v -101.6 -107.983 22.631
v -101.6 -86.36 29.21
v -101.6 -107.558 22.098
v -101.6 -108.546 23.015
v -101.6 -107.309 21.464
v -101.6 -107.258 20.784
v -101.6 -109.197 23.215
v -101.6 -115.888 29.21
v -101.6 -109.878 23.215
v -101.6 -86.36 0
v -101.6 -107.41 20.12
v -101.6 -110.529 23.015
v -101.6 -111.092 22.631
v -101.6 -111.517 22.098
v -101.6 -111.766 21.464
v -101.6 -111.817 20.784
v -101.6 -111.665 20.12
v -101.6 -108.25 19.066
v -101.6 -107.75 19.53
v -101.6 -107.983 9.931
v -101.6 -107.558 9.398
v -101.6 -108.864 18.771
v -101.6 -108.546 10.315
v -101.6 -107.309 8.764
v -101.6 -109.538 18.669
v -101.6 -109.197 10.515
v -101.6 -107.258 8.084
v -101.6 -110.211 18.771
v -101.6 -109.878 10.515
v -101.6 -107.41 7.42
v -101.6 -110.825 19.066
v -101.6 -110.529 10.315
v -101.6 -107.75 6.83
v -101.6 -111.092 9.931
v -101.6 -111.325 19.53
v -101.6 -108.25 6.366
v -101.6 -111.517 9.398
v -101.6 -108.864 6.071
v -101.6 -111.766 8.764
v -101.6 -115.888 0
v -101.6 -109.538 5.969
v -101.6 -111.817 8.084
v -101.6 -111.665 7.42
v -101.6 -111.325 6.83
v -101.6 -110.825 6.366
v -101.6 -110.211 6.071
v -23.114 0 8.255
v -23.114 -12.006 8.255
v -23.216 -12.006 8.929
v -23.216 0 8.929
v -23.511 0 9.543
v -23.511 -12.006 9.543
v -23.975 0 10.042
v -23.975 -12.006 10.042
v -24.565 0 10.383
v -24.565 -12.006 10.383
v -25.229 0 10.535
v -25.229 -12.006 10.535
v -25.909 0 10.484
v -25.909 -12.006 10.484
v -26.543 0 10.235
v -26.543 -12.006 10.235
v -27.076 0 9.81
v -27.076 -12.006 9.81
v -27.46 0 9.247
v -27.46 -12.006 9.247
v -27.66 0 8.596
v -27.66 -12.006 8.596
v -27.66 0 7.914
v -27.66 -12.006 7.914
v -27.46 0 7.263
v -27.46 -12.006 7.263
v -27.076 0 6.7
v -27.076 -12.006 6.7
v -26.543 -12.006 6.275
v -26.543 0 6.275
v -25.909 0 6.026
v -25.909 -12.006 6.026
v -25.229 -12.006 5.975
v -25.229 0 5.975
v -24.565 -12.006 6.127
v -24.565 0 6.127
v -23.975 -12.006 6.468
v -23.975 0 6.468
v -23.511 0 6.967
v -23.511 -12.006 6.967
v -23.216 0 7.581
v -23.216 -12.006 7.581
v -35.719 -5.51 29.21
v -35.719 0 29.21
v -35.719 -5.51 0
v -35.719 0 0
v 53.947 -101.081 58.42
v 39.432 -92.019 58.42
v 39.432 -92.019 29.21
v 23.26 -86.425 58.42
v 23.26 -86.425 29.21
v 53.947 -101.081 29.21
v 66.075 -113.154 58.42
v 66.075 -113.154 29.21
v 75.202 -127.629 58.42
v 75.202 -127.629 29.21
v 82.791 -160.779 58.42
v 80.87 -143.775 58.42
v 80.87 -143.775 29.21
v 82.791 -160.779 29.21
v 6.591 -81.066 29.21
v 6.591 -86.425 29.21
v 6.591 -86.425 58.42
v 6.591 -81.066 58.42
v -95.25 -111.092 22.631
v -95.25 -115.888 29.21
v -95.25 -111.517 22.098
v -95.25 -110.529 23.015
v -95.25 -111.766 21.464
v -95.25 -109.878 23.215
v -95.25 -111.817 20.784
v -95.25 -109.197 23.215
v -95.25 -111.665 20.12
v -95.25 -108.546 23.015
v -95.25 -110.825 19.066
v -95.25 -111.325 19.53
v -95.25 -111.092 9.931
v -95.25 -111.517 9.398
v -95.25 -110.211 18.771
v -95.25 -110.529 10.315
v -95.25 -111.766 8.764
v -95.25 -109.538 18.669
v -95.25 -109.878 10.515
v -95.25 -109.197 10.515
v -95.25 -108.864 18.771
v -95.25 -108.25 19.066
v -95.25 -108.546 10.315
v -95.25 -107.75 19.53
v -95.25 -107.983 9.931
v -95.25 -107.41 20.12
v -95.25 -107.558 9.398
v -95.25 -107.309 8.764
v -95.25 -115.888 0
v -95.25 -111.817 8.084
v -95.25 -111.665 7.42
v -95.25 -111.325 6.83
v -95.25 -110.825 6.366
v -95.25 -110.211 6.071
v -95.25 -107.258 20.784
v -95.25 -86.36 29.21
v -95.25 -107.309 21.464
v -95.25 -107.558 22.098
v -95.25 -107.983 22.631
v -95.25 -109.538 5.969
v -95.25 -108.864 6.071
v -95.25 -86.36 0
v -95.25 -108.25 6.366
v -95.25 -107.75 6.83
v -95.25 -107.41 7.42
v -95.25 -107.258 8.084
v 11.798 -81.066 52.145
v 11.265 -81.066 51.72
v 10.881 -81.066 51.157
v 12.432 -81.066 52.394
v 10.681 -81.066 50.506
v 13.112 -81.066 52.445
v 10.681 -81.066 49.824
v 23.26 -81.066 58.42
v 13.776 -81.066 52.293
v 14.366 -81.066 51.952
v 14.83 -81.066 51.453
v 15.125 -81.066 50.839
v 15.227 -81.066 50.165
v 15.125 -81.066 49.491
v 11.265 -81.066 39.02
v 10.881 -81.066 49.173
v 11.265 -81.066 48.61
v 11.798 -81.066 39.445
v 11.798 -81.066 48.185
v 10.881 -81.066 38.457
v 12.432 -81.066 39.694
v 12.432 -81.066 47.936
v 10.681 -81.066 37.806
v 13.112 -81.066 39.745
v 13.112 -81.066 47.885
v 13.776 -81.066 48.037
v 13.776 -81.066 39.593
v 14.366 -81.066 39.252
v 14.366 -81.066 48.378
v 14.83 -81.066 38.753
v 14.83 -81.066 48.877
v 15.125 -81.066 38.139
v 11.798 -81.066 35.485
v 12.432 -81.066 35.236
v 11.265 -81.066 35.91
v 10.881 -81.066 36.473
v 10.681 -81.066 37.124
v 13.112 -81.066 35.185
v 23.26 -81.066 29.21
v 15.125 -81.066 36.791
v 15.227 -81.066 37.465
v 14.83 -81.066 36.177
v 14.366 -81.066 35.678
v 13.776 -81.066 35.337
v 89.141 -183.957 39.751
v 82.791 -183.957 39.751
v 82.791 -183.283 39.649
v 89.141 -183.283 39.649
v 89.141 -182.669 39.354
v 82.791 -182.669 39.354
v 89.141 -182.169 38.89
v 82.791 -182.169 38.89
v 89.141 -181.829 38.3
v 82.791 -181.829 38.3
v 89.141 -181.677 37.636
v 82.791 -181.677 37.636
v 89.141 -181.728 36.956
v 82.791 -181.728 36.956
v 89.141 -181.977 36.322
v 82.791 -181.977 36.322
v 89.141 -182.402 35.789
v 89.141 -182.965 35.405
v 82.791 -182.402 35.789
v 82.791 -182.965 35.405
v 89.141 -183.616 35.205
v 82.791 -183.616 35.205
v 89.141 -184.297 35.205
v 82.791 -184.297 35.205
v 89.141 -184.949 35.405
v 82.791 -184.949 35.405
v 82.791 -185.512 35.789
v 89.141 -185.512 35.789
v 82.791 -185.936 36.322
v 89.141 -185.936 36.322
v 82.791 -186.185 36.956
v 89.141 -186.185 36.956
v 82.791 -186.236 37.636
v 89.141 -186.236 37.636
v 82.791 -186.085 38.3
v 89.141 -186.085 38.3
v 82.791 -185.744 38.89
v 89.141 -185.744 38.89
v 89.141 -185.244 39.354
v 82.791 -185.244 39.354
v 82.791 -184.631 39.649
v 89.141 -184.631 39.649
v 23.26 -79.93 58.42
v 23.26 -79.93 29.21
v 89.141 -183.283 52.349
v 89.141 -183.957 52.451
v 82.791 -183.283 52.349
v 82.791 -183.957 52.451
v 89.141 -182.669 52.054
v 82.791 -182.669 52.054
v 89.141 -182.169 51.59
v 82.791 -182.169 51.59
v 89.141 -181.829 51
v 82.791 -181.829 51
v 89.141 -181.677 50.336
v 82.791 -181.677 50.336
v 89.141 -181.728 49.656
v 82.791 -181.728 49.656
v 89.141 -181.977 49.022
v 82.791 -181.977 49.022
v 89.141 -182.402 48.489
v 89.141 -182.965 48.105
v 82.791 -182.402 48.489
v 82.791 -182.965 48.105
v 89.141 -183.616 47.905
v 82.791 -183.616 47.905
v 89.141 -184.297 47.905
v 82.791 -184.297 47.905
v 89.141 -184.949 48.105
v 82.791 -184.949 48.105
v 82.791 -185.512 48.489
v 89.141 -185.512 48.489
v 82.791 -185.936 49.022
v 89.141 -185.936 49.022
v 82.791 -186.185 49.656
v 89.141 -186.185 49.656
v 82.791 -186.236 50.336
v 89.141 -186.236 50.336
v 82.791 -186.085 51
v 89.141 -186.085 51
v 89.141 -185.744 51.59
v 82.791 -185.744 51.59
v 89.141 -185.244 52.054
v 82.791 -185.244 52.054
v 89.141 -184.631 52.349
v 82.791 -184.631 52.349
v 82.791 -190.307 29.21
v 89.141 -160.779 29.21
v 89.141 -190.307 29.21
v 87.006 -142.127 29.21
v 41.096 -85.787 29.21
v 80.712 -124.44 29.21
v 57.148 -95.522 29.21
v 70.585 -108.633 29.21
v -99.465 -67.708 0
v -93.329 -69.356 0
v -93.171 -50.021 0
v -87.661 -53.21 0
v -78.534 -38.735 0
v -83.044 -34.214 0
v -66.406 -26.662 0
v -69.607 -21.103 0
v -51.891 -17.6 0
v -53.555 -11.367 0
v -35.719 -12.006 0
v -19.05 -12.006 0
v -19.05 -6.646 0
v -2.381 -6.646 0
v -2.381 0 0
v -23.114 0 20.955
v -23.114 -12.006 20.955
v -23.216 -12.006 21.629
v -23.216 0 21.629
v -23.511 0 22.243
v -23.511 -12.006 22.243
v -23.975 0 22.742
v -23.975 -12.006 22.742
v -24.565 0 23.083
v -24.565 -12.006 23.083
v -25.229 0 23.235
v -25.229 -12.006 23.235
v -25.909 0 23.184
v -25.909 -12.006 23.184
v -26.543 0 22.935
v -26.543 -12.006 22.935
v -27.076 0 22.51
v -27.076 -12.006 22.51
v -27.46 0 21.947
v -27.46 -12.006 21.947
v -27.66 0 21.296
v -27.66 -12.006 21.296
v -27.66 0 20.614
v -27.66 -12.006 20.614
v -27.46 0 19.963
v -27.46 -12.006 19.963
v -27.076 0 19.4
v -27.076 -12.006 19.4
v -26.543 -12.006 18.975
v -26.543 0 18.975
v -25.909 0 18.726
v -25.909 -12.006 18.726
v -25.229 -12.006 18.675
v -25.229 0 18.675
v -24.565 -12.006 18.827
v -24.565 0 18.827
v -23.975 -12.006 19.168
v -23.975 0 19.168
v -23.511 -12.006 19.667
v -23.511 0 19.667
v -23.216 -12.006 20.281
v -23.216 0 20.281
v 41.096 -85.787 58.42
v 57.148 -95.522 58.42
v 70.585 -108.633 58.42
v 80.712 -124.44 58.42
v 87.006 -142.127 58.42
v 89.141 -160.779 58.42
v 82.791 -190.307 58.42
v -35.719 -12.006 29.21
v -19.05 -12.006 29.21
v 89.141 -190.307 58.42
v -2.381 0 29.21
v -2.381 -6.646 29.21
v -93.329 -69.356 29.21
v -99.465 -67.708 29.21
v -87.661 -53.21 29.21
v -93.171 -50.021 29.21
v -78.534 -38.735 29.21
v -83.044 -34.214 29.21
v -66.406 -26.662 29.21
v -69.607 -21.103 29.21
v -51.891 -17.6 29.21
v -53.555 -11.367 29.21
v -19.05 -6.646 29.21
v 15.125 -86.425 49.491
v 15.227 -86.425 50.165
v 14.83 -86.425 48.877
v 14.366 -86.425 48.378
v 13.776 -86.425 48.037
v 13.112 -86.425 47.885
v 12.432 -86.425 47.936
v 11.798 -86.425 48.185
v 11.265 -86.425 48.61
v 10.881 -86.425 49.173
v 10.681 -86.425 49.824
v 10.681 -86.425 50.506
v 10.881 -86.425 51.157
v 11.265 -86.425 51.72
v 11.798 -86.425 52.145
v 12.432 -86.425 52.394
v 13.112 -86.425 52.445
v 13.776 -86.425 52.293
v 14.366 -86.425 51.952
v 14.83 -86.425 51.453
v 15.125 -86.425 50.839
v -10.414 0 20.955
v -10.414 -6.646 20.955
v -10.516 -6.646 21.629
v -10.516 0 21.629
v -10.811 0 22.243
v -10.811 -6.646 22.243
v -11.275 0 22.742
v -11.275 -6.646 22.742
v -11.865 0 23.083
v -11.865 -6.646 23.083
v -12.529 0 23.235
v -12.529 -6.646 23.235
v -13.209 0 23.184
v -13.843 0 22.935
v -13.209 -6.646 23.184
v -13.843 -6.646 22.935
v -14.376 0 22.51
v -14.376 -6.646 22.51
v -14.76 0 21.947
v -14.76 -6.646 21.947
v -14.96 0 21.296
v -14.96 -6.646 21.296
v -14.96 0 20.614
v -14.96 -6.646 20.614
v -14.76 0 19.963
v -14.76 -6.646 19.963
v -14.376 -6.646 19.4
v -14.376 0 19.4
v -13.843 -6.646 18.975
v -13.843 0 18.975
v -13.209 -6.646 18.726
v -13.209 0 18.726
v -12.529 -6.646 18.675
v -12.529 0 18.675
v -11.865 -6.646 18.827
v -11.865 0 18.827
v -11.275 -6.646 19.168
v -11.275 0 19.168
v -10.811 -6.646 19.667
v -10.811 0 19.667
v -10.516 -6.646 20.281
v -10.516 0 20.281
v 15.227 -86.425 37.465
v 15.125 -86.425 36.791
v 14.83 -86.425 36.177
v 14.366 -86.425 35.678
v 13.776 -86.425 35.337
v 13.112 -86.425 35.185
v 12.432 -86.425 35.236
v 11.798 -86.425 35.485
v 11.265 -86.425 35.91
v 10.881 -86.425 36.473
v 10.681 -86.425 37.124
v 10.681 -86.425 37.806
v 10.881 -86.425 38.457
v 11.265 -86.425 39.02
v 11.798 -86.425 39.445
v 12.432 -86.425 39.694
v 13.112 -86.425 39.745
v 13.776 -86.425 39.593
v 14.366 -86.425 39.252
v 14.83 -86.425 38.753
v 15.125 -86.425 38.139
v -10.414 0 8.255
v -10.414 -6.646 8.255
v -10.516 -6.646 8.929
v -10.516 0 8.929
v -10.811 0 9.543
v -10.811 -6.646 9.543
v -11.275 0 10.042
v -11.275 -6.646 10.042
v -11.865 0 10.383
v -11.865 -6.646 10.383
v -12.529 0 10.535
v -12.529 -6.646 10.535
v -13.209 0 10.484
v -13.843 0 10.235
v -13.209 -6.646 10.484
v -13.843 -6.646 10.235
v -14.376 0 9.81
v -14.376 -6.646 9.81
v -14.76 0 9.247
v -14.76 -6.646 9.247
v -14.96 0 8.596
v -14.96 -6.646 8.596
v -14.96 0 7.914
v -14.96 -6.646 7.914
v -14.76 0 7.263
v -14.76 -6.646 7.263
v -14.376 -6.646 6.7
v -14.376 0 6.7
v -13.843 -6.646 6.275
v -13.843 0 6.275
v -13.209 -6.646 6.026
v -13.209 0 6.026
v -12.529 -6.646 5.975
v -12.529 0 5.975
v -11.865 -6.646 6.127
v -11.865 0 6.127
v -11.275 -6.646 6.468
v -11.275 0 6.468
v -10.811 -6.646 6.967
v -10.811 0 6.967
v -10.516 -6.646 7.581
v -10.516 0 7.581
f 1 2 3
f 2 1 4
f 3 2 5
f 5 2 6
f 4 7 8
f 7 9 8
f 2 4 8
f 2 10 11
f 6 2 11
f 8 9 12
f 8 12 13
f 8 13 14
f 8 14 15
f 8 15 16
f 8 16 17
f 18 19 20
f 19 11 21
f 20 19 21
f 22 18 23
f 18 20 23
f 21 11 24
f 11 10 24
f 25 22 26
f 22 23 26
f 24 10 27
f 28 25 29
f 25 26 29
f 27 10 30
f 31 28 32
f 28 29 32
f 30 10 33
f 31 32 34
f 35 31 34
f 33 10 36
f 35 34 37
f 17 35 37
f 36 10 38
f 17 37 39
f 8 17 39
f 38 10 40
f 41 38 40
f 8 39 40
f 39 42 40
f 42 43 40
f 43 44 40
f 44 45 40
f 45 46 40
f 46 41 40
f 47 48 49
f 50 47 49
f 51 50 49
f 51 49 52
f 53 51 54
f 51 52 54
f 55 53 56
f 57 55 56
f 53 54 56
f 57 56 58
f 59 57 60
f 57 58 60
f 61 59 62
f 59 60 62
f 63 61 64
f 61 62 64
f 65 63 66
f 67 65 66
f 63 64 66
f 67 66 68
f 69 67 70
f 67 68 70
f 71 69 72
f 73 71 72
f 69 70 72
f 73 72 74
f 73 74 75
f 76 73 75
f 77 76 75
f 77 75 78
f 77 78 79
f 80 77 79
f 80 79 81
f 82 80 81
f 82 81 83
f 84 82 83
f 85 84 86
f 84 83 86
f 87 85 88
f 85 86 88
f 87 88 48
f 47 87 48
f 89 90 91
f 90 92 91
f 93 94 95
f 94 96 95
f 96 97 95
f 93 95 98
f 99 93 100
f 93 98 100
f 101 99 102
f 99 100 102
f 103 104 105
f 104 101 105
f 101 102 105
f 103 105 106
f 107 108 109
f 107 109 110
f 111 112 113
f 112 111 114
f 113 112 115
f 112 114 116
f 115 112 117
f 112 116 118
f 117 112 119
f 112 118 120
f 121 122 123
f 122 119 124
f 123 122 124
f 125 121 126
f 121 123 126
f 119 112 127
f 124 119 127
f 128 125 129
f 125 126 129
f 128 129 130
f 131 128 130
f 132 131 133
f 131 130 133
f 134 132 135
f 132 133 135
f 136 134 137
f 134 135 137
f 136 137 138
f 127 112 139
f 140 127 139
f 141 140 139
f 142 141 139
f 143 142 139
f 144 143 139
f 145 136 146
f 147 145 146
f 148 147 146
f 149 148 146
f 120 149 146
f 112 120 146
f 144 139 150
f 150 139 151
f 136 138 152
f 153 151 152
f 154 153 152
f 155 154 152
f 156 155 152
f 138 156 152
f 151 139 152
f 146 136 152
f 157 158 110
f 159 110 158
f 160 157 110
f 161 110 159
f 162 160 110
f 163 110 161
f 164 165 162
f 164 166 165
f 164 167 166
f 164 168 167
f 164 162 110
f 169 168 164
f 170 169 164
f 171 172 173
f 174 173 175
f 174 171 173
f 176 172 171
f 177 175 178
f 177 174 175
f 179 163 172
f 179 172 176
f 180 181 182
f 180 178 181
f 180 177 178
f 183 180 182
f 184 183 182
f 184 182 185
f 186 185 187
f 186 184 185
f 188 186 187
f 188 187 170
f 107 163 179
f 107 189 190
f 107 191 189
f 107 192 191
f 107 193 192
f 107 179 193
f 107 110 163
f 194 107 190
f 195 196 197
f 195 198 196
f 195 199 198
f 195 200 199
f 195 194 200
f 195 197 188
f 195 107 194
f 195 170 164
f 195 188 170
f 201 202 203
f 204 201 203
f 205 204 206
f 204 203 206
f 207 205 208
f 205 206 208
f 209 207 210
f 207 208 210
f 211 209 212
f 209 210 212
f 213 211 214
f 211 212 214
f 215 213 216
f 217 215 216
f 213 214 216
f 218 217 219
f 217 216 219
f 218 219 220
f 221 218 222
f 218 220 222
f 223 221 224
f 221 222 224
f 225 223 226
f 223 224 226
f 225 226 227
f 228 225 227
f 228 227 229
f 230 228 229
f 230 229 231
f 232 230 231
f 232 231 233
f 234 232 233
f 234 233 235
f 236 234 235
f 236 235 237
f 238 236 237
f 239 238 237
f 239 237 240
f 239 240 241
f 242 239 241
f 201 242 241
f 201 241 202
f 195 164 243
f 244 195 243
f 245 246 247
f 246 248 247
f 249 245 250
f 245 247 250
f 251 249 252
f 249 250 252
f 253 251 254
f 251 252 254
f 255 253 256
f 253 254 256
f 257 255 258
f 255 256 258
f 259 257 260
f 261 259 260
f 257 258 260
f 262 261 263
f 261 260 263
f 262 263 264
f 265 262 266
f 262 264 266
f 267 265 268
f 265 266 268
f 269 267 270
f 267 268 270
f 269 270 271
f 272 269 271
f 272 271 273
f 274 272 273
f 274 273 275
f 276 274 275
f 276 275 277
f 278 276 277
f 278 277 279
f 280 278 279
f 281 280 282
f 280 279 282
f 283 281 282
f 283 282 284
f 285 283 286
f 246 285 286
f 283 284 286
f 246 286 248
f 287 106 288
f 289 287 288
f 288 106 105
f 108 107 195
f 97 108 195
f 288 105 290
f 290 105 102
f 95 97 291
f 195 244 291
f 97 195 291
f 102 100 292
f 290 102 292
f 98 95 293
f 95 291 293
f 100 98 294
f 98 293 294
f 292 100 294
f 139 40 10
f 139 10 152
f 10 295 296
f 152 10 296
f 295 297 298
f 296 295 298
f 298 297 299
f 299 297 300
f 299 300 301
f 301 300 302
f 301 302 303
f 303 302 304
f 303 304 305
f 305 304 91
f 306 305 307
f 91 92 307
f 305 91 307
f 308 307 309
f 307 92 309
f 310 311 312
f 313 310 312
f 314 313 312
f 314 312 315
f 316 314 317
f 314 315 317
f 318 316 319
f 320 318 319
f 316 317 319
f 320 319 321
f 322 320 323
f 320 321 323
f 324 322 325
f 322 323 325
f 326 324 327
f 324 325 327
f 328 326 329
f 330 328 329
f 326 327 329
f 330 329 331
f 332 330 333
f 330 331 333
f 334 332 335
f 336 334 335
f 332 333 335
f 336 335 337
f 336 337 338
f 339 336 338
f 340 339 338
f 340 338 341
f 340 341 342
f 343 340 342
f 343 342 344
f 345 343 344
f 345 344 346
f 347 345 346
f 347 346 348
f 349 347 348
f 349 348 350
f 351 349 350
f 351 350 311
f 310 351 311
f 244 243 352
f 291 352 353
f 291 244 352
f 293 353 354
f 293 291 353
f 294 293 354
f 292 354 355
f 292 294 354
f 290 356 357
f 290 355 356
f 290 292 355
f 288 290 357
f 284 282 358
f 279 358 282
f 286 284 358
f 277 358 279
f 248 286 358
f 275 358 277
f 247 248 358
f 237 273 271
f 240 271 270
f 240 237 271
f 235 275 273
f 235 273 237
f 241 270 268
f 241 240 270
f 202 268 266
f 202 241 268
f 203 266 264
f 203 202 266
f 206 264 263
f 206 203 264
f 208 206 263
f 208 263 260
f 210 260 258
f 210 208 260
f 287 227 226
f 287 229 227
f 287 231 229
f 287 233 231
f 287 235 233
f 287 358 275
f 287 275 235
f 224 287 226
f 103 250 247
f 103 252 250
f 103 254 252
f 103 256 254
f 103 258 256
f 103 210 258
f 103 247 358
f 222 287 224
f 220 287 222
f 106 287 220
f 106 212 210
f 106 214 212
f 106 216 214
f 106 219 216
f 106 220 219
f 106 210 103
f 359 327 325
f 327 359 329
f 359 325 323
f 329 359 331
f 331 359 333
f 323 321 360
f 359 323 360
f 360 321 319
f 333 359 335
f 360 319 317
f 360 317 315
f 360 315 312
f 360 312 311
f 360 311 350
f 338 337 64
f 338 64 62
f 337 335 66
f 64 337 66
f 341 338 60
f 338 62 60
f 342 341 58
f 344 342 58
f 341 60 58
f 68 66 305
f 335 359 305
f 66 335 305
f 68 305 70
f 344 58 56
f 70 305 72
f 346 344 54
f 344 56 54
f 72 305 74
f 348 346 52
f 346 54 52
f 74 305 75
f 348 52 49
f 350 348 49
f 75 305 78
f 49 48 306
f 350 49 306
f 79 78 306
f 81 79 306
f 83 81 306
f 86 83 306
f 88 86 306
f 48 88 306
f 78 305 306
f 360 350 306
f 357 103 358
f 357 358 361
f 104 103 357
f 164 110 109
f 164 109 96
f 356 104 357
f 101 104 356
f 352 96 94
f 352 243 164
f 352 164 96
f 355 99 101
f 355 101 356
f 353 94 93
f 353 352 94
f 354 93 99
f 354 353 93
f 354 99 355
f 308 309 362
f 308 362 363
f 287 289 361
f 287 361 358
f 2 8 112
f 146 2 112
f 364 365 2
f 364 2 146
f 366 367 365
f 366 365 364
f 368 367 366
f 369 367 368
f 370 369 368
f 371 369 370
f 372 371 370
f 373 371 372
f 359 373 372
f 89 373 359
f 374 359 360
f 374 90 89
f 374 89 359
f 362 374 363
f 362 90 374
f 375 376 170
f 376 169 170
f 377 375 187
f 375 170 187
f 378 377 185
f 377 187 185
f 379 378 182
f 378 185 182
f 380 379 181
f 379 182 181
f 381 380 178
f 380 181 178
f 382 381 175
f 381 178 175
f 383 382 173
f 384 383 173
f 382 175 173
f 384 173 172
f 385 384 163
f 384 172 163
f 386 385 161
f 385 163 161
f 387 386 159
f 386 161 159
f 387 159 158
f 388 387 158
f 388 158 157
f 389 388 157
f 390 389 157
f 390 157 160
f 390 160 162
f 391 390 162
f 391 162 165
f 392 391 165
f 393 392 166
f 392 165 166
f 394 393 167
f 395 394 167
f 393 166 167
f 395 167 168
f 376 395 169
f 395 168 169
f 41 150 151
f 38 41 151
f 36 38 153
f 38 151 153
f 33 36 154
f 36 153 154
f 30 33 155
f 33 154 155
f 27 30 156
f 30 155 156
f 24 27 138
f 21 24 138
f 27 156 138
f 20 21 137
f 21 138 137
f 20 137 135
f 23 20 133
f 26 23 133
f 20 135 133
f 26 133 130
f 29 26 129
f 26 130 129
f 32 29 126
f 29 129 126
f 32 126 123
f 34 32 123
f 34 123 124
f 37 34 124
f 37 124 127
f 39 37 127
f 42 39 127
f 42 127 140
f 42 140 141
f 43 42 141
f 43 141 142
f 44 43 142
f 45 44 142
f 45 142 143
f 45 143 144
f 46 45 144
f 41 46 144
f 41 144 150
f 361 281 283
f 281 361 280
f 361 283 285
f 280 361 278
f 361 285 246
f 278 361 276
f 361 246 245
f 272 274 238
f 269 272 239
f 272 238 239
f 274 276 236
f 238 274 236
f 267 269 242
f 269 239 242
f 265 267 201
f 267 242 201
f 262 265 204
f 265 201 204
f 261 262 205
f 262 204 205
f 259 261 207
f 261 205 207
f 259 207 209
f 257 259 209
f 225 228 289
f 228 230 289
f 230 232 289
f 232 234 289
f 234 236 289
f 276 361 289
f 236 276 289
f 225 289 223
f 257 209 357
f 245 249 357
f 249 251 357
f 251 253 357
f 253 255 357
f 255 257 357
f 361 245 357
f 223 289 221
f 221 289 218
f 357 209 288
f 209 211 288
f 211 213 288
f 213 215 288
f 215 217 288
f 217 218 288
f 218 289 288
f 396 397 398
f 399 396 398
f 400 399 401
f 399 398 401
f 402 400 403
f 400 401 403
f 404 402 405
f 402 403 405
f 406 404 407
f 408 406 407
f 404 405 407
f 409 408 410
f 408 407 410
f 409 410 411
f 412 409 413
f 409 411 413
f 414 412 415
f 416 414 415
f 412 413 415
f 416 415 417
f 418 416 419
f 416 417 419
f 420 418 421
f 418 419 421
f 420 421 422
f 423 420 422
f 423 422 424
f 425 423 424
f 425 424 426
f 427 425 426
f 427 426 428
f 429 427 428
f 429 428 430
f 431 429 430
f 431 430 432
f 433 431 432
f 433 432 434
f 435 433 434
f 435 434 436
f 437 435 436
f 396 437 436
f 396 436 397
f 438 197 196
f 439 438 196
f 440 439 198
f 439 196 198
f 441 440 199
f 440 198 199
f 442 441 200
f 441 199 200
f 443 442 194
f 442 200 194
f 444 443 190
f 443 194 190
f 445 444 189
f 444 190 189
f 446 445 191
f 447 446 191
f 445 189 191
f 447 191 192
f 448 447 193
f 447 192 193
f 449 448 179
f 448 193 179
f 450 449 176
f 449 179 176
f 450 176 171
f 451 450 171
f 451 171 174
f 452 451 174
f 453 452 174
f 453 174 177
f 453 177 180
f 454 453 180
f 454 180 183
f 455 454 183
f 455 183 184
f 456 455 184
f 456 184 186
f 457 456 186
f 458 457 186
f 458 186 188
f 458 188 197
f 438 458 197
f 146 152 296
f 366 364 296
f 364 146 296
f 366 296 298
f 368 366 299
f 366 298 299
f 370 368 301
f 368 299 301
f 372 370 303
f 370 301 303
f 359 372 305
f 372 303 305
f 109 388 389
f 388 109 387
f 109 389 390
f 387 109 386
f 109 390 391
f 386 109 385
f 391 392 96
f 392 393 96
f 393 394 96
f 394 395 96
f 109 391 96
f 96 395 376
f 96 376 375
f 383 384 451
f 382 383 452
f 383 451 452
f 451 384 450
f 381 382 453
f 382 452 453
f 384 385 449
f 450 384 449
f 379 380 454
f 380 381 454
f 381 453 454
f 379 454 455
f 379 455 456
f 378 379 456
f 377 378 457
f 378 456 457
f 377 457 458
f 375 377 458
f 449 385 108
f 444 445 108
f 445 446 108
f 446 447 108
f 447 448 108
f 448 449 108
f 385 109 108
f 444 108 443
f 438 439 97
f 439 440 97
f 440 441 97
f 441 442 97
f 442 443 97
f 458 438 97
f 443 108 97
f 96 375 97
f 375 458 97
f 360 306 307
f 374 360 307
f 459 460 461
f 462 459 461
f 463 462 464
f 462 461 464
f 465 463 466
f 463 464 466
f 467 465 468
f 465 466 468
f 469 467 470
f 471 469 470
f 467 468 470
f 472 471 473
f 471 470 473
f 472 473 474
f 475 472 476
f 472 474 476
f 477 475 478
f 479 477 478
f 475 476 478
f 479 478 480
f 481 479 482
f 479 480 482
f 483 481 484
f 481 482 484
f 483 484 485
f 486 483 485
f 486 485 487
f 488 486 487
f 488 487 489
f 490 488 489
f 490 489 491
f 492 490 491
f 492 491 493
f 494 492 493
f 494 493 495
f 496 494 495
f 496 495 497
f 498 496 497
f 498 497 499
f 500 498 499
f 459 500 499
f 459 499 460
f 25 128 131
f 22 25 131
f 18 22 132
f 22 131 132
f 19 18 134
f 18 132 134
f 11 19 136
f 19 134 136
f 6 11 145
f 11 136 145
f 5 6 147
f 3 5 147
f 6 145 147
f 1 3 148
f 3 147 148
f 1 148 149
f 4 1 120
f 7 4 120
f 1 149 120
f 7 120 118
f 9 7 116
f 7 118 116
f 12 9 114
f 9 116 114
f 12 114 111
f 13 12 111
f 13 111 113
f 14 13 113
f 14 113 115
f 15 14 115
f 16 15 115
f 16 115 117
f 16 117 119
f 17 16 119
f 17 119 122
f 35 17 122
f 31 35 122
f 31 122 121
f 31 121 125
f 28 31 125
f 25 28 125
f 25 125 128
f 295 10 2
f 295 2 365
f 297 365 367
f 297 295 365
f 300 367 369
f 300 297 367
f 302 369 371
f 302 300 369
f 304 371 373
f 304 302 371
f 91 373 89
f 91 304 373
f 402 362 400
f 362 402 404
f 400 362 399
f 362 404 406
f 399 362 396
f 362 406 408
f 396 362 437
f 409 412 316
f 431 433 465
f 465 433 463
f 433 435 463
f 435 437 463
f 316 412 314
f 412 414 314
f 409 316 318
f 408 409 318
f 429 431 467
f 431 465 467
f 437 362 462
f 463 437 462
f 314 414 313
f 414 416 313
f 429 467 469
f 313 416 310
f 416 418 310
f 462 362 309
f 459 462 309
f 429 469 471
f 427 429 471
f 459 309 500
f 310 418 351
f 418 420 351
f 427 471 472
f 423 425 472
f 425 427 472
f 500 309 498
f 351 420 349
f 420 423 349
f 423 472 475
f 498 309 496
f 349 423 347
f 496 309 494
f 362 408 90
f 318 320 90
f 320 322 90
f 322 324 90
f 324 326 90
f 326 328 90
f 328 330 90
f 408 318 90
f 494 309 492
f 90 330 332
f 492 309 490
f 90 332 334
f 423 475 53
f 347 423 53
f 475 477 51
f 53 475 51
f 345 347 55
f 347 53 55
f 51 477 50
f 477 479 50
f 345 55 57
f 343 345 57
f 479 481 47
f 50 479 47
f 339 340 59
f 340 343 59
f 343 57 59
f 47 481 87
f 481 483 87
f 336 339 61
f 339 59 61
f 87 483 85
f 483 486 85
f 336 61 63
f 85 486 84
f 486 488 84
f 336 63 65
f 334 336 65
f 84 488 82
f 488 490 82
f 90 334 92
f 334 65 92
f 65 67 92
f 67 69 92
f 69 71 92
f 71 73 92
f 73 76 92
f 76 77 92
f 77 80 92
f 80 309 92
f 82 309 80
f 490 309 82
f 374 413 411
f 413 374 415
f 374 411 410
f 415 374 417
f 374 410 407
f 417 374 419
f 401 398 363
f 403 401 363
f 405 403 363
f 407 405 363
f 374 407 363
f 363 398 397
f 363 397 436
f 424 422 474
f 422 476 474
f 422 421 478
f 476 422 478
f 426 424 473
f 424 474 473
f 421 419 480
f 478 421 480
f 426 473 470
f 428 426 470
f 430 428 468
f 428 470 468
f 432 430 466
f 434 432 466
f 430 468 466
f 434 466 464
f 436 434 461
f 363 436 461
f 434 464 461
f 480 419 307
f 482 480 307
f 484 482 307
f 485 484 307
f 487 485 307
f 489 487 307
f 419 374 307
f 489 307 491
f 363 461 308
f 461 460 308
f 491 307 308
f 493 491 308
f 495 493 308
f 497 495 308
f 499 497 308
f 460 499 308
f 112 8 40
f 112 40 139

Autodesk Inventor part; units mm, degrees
ref_plane "YZ Plane" through (0, 0, 0) normal (1, 0, 0) x (0, 1, 0)
ref_plane "XZ Plane" through (0, 0, 0) normal (0, 1, 0) x (-1, 0, 0)
ref_plane "XY Plane" through (0, 0, 0) normal (0, 0, 1) x (1, 0, 0)
ref_plane "Work Plane1" through (0, 0, 0) normal (0, 0, 1) x (1, 0, 0)
sketch "Sketch1" plane through (0, 0, 0) normal (0, 0, 1) x (1, 0, 0)
  line L0 (-103.1875, -92.8688) -> (-103.1875, -100.8761)
  line L1 (-2.3812, 0) -> (-35.7187, 0)
  line L2 (63.5, -115.8875) -> (63.5, -53.6292)
  line L3 (62.7062, -115.8875) -> (51.816, -115.8875)
  line L4 (-38.1, 13.2715) -> (-38.1, 2.3812)
  line L5 (0, 2.3812) -> (0, 13.2715)
  line L6 (63.5, -115.8875) -> (57.15, -115.8875)
  line L7 (57.15, -115.8875) -> (57.15, -86.36)
  line L8 (57.15, -86.36) -> (63.5, -86.36)
  line L9 (63.5, -86.36) -> (63.5, -115.8875)
  line L10 (-101.6, -115.8875) -> (-95.25, -115.8875)
  line L11 (-95.25, -115.8875) -> (-95.25, -86.36)
  line L12 (-95.25, -86.36) -> (-101.6, -86.36)
  line L13 (-101.6, -86.36) -> (-101.6, -115.8875)
  arc A0 (63.5, -86.36) -> (-101.6, -86.36) centre (-19.05, -86.36) ccw
  arc A1 (57.15, -86.36) -> (-95.25, -86.36) centre (-19.05, -86.36) ccw
  line L14 (-101.6, -104.2768) -> (-101.6, -115.8875)
  line L15 (-35.7187, 0) -> (-35.7187, -5.5104)
  line L16 (-2.3812, 0) -> (-2.3812, -5.5104)
  line L17 (-35.7187, 0) -> (-2.3812, 0)
  line L18 (-35.7187, -12.0055) -> (-2.3812, -12.0055)
  line L19 (-19.05, -12.0055) -> (-19.05, -6.6462)
  line L20 (-19.05, -6.6462) -> (-2.3812, -6.6462)
  line L21 (-2.3812, -6.6462) -> (-2.3812, -5.5104)
  point P0 (0, 0)
  point P1 (57.2611, -115.8875)
  point P2 (-19.05, 0)
  point P3 (-19.05, -3.81)
extrude "Extrusion1" add sketch "Sketch1" along normal blind 29.21 contours L16 A0 L15 L1 | L21 L20 L19 A1 L12 A0 | L12 L11 L10 L13 | L19 L18 A1 picked at (-28.3271, -11.6643)
sketch "Sketch2" plane through (0, 0, 29.21) normal (0, 0, 1) x (1, 0, 0)
  line L0 (-77.5465, -167.288) -> (-77.5465, -175.2953)
  line L1 (23.2597, -74.4192) -> (-10.0778, -74.4192)
  line L2 (89.141, -190.3067) -> (89.141, -128.0485)
  line L3 (88.3472, -190.3067) -> (77.457, -190.3067)
  line L4 (-12.459, -61.1477) -> (-12.459, -72.038)
  line L5 (25.641, -72.038) -> (25.641, -61.1477)
  line L6 (89.141, -190.3067) -> (82.791, -190.3067)
  line L7 (82.791, -190.3067) -> (82.791, -160.7792)
  line L8 (82.791, -160.7792) -> (89.141, -160.7792)
  line L9 (89.141, -160.7792) -> (89.141, -190.3067)
  line L10 (-75.959, -190.3067) -> (-69.609, -190.3067)
  line L11 (-69.609, -190.3067) -> (-69.609, -160.7792)
  line L12 (-69.609, -160.7792) -> (-75.959, -160.7792)
  line L13 (-75.959, -160.7792) -> (-75.959, -190.3067)
  arc A0 (89.141, -160.7792) -> (-75.959, -160.7792) centre (6.591, -160.7792) ccw
  arc A1 (82.791, -160.7792) -> (-69.609, -160.7792) centre (6.591, -160.7792) ccw
  line L14 (-75.959, -178.6961) -> (-75.959, -190.3067)
  line L15 (-10.0778, -74.4192) -> (-10.0778, -79.9296)
  line L16 (23.2597, -74.4192) -> (23.2597, -79.9296)
  line L17 (-10.0778, -74.4192) -> (23.2597, -74.4192)
  line L18 (-10.0778, -86.4247) -> (23.2597, -86.4247)
  line L19 (6.591, -86.4247) -> (6.591, -81.0655)
  line L20 (6.591, -81.0655) -> (23.2597, -81.0655)
  line L21 (23.2597, -81.0655) -> (23.2597, -79.9296)
  point P0 (0, 0)
  point P1 (25.641, -74.4192)
  point P2 (82.9021, -190.3067)
  point P3 (6.591, -74.4192)
  point P4 (6.591, -78.2292)
  dimension "d7" = 6.35
  dimension "d8" = 6.35
  dimension "d9" = 3.81
extrude "Extrusion2" add sketch "Sketch2" along normal blind 29.21 separate body contours A0 L8 A1 L19 L20 L21 | L2 L6 L3 L7 L8 | L18 L19 A1 picked at (15.8681, -86.0836)
sketch "Sketch3" plane through (-95.25, -115.8875, 0) normal (1, 0, 0) x (0, 0, -1)
  circle A0 centre (-8.255, 6.35) radius 2.286
  circle A1 centre (-20.955, 6.35) radius 2.286
  line L0 (0, 0) -> (0, 29.5275) projected
  line L1 (0, 0) -> (-29.21, 0) projected
  point P0 (0, 115.8875)
  dimension "d12" = 4.572
  dimension "d13" = 4.572
  dimension "d14" = 12.7
  dimension "d15" = 8.255
  dimension "d42" = 6.35
extrude "Extrusion3" cut sketch "Sketch3" against normal blind 29.21 bodies 1
sketch "Sketch4" plane through (-35.7187, -12.0055, 0) normal (0, -1, 0) x (1, 0, 0)
  circle A0 centre (10.3187, 20.955) radius 2.286
  circle A1 centre (10.3187, 8.255) radius 2.286
  circle A2 centre (23.0187, 20.955) radius 2.286
  circle A3 centre (23.0187, 8.255) radius 2.286
  line L0 (16.6688, 0) -> (16.6687, 29.21) projected
  line L1 (0, 0) -> (16.6688, 0) projected
  point P0 (35.7187, 0)
  dimension "d18" = 4.572
  dimension "d19" = 4.572
  dimension "d20" = 12.7
  dimension "d21" = 4.572
  dimension "d22" = 4.572
  dimension "d23" = 12.7
  dimension "d24" = 6.35
  dimension "d25" = 8.255
extrude "Extrusion4" cut sketch "Sketch4" against normal blind 29.21 bodies 1
sketch "Sketch5" plane through (6.591, -81.0655, 29.21) normal (0, 1, 0) x (1, 0, 0)
  circle A0 centre (6.35, -20.955) radius 2.286
  circle A1 centre (6.35, -8.255) radius 2.286
  line L0 (16.6688, -29.21) -> (0, -29.21) projected
  line L1 (0, 0) -> (0, -29.21) projected
  point P0 (-6.591, 29.21)
  dimension "d28" = 4.572
  dimension "d29" = 4.572
  dimension "d30" = 12.7
  dimension "d31" = 8.255
  dimension "d32" = 6.35
extrude "Extrusion5" cut sketch "Sketch5" against normal blind 29.21 bodies 2
sketch "Sketch6" plane through (82.791, -190.3067, 29.21) normal (-1, 0, 0) x (0, 0, 1)
  circle A0 centre (8.255, 6.35) radius 2.286
  circle A1 centre (20.955, 6.35) radius 2.286
  line L0 (0, 29.5275) -> (0, 0) projected
  line L1 (0, 0) -> (29.21, 0) projected
  point P0 (-29.21, 190.3067)
  dimension "d35" = 4.572
  dimension "d36" = 4.572
  dimension "d37" = 12.7
  dimension "d38" = 8.255
  dimension "d39" = 6.35
extrude "Extrusion6" cut sketch "Sketch6" against normal blind 29.21 bodies 2
properties part number "intakeConstraint"
